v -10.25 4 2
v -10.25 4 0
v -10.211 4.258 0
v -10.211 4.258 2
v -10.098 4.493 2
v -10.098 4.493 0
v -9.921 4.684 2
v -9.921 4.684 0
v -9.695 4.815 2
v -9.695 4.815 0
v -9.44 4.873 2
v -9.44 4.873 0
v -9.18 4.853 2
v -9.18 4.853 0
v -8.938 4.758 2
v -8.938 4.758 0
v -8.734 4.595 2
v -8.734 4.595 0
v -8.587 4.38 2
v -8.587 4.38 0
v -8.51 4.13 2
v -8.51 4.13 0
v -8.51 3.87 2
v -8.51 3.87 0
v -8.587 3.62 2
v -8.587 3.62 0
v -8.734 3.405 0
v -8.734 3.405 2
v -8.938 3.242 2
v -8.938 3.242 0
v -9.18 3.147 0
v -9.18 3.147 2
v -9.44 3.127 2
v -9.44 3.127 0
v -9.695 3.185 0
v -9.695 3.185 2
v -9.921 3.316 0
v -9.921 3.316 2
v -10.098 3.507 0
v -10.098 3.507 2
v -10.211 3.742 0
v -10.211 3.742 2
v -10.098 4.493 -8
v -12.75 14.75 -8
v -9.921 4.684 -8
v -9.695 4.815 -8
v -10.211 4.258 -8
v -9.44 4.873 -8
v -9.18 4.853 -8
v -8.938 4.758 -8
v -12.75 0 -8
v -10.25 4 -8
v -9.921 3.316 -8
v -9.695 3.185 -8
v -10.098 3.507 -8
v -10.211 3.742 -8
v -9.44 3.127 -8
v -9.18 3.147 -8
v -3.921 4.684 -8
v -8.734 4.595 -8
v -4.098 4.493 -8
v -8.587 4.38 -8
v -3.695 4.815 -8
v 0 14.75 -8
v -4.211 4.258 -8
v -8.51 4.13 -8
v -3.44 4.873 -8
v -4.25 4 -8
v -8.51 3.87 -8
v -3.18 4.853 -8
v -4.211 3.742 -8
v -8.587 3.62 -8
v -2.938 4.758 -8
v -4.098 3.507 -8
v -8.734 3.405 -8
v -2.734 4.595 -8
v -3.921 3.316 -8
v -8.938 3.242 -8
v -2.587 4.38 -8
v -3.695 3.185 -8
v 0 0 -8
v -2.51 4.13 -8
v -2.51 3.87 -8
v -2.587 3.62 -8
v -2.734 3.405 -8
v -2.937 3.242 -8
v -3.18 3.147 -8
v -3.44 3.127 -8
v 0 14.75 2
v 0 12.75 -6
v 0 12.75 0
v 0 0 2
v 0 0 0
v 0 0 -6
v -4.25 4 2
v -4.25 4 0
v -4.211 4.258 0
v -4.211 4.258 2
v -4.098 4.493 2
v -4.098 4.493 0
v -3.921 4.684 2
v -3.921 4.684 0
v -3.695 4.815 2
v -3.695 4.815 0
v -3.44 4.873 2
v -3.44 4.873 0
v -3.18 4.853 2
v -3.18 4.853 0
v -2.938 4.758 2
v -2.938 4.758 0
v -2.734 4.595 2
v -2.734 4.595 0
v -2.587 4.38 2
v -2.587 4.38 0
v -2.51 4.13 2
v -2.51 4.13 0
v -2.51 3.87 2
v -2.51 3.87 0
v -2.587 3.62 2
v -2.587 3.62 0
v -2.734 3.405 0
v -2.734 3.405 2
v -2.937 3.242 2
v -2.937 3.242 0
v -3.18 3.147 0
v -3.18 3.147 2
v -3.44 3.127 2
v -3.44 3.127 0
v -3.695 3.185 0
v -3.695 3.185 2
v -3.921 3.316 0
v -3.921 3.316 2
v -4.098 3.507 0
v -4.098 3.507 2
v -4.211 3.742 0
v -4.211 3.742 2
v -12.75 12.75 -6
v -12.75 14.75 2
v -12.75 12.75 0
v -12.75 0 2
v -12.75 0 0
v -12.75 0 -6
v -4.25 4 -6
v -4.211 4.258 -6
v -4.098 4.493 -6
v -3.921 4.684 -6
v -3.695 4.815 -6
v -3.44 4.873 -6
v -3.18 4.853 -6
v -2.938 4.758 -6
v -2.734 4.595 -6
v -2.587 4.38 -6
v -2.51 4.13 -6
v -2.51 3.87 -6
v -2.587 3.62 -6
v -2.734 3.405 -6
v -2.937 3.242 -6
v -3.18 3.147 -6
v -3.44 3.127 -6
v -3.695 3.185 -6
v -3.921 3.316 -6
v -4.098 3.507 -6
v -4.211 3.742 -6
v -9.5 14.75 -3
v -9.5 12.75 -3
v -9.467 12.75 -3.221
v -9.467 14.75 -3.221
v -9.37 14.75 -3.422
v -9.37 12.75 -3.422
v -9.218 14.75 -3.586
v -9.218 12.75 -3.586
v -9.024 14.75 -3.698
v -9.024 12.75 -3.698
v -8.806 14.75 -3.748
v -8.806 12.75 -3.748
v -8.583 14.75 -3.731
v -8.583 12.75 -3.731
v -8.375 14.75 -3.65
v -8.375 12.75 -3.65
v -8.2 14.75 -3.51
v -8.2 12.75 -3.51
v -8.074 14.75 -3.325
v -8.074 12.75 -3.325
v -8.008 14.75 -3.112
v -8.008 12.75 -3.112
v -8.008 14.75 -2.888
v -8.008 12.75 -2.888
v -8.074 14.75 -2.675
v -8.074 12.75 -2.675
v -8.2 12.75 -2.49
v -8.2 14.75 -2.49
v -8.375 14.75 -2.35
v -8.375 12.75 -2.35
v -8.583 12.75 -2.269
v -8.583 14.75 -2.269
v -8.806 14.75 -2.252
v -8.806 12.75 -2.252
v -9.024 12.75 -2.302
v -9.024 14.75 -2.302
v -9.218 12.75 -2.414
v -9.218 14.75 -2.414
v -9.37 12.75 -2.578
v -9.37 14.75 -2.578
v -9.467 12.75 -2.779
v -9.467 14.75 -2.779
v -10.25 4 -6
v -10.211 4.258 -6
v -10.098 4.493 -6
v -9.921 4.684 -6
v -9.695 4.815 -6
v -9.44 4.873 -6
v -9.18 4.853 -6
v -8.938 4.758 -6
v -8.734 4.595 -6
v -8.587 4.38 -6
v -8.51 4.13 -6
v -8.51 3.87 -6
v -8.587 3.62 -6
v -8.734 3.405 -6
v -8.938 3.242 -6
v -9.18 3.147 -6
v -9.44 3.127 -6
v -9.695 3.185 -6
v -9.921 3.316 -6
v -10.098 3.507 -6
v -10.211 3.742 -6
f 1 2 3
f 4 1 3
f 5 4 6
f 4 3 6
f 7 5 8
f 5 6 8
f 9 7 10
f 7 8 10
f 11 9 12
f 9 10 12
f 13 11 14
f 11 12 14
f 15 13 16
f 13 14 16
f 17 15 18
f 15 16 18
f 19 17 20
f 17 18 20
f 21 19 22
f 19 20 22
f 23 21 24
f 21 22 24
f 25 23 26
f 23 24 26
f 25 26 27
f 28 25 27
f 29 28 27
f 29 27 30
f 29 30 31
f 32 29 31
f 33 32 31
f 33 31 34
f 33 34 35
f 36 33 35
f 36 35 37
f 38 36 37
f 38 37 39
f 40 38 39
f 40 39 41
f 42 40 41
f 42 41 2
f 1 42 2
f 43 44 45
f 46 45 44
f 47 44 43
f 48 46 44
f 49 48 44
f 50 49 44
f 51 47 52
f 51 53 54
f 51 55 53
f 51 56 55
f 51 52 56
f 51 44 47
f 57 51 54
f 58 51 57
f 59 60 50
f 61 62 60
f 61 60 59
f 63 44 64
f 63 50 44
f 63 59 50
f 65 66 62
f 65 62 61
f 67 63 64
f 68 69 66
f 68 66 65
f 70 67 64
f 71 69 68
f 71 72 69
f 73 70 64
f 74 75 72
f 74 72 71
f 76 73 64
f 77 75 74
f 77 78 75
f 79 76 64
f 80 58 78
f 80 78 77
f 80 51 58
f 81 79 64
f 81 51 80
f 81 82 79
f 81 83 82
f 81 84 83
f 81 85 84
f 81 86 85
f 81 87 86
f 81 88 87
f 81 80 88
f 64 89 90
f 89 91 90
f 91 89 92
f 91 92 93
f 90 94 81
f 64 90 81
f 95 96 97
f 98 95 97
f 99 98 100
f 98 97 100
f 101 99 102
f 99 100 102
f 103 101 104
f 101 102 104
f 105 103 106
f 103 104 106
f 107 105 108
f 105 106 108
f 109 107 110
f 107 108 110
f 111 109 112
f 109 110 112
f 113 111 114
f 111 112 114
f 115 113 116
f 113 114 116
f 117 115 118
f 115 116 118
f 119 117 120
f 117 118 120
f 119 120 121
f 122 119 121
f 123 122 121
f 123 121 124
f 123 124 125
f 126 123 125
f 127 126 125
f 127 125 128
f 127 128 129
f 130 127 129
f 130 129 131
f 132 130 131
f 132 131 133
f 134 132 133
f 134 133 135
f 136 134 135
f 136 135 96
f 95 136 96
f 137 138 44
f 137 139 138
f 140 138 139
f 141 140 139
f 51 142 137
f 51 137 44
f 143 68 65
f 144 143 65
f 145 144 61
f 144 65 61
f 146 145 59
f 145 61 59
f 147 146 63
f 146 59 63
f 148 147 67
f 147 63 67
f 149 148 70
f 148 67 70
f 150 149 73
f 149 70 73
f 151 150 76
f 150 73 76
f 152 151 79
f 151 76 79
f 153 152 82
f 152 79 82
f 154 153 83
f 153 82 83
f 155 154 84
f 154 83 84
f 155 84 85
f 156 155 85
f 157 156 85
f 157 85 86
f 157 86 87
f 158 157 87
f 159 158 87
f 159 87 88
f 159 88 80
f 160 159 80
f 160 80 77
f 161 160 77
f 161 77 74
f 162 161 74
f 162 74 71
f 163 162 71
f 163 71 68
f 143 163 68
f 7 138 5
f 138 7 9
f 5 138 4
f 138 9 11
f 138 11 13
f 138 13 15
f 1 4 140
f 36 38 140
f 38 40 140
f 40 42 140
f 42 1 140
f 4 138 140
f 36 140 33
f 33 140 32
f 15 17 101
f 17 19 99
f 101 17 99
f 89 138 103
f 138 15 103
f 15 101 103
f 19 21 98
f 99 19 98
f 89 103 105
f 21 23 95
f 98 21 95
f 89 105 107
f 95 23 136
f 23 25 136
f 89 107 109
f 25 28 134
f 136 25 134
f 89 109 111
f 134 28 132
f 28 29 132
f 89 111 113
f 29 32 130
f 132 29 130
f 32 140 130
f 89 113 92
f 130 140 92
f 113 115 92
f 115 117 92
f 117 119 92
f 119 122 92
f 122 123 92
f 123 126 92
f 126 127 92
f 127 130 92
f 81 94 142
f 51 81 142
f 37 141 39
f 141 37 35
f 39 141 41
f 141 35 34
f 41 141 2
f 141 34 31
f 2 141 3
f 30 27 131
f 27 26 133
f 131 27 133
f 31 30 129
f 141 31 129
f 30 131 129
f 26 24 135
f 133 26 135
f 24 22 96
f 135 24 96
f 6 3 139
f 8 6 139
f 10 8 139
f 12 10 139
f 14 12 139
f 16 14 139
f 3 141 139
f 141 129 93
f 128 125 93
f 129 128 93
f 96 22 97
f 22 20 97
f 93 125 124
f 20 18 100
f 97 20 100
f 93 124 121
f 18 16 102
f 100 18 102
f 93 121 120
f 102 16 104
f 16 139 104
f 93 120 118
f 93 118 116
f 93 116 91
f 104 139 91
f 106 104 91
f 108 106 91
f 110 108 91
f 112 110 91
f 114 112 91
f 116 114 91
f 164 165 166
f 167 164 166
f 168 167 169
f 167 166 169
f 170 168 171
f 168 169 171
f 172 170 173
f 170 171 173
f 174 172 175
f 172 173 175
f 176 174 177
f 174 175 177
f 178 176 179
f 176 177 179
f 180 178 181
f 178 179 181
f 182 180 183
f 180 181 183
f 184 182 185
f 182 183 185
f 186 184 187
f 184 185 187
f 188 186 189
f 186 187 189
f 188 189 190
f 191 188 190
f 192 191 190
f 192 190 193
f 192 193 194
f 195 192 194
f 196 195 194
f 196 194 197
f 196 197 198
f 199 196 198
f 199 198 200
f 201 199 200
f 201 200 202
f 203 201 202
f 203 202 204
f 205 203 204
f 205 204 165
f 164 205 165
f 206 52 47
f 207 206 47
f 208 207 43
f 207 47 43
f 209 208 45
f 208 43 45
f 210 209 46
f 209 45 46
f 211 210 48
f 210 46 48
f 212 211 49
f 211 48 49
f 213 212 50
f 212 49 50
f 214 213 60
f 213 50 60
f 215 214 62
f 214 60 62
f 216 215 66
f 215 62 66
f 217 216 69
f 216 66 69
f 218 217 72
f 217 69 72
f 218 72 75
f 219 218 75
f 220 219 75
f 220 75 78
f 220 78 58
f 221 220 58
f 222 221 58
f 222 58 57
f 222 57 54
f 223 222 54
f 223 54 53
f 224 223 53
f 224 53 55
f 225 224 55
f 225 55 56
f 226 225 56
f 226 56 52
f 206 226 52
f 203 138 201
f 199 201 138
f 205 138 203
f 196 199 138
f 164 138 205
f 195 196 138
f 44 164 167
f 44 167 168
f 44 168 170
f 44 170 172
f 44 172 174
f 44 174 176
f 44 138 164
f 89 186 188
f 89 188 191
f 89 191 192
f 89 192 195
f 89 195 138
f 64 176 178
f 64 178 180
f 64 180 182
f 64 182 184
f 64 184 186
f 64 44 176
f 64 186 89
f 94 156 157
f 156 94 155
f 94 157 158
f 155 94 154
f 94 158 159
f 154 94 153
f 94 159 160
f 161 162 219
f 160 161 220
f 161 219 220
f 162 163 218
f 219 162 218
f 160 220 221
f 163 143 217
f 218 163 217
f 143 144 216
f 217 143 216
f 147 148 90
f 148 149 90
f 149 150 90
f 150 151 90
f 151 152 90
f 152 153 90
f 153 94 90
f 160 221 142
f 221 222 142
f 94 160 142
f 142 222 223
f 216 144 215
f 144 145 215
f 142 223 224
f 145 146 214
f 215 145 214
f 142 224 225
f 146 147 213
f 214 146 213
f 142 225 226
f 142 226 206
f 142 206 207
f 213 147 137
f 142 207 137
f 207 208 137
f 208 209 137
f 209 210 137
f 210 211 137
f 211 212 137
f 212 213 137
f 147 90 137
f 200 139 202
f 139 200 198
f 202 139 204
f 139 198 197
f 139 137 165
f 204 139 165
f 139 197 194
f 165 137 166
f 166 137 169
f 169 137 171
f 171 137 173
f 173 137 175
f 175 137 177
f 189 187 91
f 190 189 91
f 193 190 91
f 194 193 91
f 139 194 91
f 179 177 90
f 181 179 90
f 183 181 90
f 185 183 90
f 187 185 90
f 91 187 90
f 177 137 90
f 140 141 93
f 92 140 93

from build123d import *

# Parameters (mm, degrees)
SKETCH1_W             = 12.75
SKETCH1_H             = 12.75
BOSS_EXTRUDE1_DEPTH   = 2
SKETCH2_W             = 12.75
SKETCH2_H             = 12.75
BOSS_EXTRUDE2_DEPTH   = 2
SKETCH3_W             = 12.75
SKETCH3_H             = 10
BOSS_EXTRUDE3_DEPTH   = 2
F_1_0MM_DOWEL_HOLE1_D = 1.75
F_1_0MM_DOWEL_HOLE2_D = 1.5


with BuildPart() as part:
    # Sketch1 → Boss-Extrude1 (new body)
    with BuildSketch(Plane.XY):
        with Locations((-6.375, 6.375)):
            Rectangle(SKETCH1_W, SKETCH1_H)
    extrude(amount=BOSS_EXTRUDE1_DEPTH)



with BuildPart() as body_2:
    # Sketch2 → Boss-Extrude2 (new body)
    with BuildSketch(Plane(origin=(0, 0, -6), x_dir=(-1, 0, 0), z_dir=(0, 0, -1))):
        with Locations((6.375, 6.375)):
            Rectangle(SKETCH2_W, SKETCH2_H)
    extrude(amount=BOSS_EXTRUDE2_DEPTH)


with BuildPart() as part_1:
    add(part.part)

    add(body_2.part)  # Boss-Extrude3 merges body 2
    # Sketch3 → Boss-Extrude3 (add)
    with BuildSketch(Plane(origin=(0, 12.75, 0), x_dir=(1, 0, 0), z_dir=(0, 1, 0))):
        with Locations((-6.375, 3)):
            Rectangle(SKETCH3_W, SKETCH3_H)
    extrude(amount=BOSS_EXTRUDE3_DEPTH)

    # Ø1.0mm Dowel Hole1 (through all)
    with Locations(Plane.XY.offset(2)):
        with Locations((-9.375, 4), (-3.375, 4)):
            Hole(F_1_0MM_DOWEL_HOLE1_D / 2)

    # Ø1.0mm Dowel Hole2 (through all)
    with Locations(Plane(origin=(0, 14.75, 0), x_dir=(1, 0, 0), z_dir=(0, 1, 0))):
        with Locations((-8.75, 3)):
            Hole(F_1_0MM_DOWEL_HOLE2_D / 2)


solid = part_1.part
